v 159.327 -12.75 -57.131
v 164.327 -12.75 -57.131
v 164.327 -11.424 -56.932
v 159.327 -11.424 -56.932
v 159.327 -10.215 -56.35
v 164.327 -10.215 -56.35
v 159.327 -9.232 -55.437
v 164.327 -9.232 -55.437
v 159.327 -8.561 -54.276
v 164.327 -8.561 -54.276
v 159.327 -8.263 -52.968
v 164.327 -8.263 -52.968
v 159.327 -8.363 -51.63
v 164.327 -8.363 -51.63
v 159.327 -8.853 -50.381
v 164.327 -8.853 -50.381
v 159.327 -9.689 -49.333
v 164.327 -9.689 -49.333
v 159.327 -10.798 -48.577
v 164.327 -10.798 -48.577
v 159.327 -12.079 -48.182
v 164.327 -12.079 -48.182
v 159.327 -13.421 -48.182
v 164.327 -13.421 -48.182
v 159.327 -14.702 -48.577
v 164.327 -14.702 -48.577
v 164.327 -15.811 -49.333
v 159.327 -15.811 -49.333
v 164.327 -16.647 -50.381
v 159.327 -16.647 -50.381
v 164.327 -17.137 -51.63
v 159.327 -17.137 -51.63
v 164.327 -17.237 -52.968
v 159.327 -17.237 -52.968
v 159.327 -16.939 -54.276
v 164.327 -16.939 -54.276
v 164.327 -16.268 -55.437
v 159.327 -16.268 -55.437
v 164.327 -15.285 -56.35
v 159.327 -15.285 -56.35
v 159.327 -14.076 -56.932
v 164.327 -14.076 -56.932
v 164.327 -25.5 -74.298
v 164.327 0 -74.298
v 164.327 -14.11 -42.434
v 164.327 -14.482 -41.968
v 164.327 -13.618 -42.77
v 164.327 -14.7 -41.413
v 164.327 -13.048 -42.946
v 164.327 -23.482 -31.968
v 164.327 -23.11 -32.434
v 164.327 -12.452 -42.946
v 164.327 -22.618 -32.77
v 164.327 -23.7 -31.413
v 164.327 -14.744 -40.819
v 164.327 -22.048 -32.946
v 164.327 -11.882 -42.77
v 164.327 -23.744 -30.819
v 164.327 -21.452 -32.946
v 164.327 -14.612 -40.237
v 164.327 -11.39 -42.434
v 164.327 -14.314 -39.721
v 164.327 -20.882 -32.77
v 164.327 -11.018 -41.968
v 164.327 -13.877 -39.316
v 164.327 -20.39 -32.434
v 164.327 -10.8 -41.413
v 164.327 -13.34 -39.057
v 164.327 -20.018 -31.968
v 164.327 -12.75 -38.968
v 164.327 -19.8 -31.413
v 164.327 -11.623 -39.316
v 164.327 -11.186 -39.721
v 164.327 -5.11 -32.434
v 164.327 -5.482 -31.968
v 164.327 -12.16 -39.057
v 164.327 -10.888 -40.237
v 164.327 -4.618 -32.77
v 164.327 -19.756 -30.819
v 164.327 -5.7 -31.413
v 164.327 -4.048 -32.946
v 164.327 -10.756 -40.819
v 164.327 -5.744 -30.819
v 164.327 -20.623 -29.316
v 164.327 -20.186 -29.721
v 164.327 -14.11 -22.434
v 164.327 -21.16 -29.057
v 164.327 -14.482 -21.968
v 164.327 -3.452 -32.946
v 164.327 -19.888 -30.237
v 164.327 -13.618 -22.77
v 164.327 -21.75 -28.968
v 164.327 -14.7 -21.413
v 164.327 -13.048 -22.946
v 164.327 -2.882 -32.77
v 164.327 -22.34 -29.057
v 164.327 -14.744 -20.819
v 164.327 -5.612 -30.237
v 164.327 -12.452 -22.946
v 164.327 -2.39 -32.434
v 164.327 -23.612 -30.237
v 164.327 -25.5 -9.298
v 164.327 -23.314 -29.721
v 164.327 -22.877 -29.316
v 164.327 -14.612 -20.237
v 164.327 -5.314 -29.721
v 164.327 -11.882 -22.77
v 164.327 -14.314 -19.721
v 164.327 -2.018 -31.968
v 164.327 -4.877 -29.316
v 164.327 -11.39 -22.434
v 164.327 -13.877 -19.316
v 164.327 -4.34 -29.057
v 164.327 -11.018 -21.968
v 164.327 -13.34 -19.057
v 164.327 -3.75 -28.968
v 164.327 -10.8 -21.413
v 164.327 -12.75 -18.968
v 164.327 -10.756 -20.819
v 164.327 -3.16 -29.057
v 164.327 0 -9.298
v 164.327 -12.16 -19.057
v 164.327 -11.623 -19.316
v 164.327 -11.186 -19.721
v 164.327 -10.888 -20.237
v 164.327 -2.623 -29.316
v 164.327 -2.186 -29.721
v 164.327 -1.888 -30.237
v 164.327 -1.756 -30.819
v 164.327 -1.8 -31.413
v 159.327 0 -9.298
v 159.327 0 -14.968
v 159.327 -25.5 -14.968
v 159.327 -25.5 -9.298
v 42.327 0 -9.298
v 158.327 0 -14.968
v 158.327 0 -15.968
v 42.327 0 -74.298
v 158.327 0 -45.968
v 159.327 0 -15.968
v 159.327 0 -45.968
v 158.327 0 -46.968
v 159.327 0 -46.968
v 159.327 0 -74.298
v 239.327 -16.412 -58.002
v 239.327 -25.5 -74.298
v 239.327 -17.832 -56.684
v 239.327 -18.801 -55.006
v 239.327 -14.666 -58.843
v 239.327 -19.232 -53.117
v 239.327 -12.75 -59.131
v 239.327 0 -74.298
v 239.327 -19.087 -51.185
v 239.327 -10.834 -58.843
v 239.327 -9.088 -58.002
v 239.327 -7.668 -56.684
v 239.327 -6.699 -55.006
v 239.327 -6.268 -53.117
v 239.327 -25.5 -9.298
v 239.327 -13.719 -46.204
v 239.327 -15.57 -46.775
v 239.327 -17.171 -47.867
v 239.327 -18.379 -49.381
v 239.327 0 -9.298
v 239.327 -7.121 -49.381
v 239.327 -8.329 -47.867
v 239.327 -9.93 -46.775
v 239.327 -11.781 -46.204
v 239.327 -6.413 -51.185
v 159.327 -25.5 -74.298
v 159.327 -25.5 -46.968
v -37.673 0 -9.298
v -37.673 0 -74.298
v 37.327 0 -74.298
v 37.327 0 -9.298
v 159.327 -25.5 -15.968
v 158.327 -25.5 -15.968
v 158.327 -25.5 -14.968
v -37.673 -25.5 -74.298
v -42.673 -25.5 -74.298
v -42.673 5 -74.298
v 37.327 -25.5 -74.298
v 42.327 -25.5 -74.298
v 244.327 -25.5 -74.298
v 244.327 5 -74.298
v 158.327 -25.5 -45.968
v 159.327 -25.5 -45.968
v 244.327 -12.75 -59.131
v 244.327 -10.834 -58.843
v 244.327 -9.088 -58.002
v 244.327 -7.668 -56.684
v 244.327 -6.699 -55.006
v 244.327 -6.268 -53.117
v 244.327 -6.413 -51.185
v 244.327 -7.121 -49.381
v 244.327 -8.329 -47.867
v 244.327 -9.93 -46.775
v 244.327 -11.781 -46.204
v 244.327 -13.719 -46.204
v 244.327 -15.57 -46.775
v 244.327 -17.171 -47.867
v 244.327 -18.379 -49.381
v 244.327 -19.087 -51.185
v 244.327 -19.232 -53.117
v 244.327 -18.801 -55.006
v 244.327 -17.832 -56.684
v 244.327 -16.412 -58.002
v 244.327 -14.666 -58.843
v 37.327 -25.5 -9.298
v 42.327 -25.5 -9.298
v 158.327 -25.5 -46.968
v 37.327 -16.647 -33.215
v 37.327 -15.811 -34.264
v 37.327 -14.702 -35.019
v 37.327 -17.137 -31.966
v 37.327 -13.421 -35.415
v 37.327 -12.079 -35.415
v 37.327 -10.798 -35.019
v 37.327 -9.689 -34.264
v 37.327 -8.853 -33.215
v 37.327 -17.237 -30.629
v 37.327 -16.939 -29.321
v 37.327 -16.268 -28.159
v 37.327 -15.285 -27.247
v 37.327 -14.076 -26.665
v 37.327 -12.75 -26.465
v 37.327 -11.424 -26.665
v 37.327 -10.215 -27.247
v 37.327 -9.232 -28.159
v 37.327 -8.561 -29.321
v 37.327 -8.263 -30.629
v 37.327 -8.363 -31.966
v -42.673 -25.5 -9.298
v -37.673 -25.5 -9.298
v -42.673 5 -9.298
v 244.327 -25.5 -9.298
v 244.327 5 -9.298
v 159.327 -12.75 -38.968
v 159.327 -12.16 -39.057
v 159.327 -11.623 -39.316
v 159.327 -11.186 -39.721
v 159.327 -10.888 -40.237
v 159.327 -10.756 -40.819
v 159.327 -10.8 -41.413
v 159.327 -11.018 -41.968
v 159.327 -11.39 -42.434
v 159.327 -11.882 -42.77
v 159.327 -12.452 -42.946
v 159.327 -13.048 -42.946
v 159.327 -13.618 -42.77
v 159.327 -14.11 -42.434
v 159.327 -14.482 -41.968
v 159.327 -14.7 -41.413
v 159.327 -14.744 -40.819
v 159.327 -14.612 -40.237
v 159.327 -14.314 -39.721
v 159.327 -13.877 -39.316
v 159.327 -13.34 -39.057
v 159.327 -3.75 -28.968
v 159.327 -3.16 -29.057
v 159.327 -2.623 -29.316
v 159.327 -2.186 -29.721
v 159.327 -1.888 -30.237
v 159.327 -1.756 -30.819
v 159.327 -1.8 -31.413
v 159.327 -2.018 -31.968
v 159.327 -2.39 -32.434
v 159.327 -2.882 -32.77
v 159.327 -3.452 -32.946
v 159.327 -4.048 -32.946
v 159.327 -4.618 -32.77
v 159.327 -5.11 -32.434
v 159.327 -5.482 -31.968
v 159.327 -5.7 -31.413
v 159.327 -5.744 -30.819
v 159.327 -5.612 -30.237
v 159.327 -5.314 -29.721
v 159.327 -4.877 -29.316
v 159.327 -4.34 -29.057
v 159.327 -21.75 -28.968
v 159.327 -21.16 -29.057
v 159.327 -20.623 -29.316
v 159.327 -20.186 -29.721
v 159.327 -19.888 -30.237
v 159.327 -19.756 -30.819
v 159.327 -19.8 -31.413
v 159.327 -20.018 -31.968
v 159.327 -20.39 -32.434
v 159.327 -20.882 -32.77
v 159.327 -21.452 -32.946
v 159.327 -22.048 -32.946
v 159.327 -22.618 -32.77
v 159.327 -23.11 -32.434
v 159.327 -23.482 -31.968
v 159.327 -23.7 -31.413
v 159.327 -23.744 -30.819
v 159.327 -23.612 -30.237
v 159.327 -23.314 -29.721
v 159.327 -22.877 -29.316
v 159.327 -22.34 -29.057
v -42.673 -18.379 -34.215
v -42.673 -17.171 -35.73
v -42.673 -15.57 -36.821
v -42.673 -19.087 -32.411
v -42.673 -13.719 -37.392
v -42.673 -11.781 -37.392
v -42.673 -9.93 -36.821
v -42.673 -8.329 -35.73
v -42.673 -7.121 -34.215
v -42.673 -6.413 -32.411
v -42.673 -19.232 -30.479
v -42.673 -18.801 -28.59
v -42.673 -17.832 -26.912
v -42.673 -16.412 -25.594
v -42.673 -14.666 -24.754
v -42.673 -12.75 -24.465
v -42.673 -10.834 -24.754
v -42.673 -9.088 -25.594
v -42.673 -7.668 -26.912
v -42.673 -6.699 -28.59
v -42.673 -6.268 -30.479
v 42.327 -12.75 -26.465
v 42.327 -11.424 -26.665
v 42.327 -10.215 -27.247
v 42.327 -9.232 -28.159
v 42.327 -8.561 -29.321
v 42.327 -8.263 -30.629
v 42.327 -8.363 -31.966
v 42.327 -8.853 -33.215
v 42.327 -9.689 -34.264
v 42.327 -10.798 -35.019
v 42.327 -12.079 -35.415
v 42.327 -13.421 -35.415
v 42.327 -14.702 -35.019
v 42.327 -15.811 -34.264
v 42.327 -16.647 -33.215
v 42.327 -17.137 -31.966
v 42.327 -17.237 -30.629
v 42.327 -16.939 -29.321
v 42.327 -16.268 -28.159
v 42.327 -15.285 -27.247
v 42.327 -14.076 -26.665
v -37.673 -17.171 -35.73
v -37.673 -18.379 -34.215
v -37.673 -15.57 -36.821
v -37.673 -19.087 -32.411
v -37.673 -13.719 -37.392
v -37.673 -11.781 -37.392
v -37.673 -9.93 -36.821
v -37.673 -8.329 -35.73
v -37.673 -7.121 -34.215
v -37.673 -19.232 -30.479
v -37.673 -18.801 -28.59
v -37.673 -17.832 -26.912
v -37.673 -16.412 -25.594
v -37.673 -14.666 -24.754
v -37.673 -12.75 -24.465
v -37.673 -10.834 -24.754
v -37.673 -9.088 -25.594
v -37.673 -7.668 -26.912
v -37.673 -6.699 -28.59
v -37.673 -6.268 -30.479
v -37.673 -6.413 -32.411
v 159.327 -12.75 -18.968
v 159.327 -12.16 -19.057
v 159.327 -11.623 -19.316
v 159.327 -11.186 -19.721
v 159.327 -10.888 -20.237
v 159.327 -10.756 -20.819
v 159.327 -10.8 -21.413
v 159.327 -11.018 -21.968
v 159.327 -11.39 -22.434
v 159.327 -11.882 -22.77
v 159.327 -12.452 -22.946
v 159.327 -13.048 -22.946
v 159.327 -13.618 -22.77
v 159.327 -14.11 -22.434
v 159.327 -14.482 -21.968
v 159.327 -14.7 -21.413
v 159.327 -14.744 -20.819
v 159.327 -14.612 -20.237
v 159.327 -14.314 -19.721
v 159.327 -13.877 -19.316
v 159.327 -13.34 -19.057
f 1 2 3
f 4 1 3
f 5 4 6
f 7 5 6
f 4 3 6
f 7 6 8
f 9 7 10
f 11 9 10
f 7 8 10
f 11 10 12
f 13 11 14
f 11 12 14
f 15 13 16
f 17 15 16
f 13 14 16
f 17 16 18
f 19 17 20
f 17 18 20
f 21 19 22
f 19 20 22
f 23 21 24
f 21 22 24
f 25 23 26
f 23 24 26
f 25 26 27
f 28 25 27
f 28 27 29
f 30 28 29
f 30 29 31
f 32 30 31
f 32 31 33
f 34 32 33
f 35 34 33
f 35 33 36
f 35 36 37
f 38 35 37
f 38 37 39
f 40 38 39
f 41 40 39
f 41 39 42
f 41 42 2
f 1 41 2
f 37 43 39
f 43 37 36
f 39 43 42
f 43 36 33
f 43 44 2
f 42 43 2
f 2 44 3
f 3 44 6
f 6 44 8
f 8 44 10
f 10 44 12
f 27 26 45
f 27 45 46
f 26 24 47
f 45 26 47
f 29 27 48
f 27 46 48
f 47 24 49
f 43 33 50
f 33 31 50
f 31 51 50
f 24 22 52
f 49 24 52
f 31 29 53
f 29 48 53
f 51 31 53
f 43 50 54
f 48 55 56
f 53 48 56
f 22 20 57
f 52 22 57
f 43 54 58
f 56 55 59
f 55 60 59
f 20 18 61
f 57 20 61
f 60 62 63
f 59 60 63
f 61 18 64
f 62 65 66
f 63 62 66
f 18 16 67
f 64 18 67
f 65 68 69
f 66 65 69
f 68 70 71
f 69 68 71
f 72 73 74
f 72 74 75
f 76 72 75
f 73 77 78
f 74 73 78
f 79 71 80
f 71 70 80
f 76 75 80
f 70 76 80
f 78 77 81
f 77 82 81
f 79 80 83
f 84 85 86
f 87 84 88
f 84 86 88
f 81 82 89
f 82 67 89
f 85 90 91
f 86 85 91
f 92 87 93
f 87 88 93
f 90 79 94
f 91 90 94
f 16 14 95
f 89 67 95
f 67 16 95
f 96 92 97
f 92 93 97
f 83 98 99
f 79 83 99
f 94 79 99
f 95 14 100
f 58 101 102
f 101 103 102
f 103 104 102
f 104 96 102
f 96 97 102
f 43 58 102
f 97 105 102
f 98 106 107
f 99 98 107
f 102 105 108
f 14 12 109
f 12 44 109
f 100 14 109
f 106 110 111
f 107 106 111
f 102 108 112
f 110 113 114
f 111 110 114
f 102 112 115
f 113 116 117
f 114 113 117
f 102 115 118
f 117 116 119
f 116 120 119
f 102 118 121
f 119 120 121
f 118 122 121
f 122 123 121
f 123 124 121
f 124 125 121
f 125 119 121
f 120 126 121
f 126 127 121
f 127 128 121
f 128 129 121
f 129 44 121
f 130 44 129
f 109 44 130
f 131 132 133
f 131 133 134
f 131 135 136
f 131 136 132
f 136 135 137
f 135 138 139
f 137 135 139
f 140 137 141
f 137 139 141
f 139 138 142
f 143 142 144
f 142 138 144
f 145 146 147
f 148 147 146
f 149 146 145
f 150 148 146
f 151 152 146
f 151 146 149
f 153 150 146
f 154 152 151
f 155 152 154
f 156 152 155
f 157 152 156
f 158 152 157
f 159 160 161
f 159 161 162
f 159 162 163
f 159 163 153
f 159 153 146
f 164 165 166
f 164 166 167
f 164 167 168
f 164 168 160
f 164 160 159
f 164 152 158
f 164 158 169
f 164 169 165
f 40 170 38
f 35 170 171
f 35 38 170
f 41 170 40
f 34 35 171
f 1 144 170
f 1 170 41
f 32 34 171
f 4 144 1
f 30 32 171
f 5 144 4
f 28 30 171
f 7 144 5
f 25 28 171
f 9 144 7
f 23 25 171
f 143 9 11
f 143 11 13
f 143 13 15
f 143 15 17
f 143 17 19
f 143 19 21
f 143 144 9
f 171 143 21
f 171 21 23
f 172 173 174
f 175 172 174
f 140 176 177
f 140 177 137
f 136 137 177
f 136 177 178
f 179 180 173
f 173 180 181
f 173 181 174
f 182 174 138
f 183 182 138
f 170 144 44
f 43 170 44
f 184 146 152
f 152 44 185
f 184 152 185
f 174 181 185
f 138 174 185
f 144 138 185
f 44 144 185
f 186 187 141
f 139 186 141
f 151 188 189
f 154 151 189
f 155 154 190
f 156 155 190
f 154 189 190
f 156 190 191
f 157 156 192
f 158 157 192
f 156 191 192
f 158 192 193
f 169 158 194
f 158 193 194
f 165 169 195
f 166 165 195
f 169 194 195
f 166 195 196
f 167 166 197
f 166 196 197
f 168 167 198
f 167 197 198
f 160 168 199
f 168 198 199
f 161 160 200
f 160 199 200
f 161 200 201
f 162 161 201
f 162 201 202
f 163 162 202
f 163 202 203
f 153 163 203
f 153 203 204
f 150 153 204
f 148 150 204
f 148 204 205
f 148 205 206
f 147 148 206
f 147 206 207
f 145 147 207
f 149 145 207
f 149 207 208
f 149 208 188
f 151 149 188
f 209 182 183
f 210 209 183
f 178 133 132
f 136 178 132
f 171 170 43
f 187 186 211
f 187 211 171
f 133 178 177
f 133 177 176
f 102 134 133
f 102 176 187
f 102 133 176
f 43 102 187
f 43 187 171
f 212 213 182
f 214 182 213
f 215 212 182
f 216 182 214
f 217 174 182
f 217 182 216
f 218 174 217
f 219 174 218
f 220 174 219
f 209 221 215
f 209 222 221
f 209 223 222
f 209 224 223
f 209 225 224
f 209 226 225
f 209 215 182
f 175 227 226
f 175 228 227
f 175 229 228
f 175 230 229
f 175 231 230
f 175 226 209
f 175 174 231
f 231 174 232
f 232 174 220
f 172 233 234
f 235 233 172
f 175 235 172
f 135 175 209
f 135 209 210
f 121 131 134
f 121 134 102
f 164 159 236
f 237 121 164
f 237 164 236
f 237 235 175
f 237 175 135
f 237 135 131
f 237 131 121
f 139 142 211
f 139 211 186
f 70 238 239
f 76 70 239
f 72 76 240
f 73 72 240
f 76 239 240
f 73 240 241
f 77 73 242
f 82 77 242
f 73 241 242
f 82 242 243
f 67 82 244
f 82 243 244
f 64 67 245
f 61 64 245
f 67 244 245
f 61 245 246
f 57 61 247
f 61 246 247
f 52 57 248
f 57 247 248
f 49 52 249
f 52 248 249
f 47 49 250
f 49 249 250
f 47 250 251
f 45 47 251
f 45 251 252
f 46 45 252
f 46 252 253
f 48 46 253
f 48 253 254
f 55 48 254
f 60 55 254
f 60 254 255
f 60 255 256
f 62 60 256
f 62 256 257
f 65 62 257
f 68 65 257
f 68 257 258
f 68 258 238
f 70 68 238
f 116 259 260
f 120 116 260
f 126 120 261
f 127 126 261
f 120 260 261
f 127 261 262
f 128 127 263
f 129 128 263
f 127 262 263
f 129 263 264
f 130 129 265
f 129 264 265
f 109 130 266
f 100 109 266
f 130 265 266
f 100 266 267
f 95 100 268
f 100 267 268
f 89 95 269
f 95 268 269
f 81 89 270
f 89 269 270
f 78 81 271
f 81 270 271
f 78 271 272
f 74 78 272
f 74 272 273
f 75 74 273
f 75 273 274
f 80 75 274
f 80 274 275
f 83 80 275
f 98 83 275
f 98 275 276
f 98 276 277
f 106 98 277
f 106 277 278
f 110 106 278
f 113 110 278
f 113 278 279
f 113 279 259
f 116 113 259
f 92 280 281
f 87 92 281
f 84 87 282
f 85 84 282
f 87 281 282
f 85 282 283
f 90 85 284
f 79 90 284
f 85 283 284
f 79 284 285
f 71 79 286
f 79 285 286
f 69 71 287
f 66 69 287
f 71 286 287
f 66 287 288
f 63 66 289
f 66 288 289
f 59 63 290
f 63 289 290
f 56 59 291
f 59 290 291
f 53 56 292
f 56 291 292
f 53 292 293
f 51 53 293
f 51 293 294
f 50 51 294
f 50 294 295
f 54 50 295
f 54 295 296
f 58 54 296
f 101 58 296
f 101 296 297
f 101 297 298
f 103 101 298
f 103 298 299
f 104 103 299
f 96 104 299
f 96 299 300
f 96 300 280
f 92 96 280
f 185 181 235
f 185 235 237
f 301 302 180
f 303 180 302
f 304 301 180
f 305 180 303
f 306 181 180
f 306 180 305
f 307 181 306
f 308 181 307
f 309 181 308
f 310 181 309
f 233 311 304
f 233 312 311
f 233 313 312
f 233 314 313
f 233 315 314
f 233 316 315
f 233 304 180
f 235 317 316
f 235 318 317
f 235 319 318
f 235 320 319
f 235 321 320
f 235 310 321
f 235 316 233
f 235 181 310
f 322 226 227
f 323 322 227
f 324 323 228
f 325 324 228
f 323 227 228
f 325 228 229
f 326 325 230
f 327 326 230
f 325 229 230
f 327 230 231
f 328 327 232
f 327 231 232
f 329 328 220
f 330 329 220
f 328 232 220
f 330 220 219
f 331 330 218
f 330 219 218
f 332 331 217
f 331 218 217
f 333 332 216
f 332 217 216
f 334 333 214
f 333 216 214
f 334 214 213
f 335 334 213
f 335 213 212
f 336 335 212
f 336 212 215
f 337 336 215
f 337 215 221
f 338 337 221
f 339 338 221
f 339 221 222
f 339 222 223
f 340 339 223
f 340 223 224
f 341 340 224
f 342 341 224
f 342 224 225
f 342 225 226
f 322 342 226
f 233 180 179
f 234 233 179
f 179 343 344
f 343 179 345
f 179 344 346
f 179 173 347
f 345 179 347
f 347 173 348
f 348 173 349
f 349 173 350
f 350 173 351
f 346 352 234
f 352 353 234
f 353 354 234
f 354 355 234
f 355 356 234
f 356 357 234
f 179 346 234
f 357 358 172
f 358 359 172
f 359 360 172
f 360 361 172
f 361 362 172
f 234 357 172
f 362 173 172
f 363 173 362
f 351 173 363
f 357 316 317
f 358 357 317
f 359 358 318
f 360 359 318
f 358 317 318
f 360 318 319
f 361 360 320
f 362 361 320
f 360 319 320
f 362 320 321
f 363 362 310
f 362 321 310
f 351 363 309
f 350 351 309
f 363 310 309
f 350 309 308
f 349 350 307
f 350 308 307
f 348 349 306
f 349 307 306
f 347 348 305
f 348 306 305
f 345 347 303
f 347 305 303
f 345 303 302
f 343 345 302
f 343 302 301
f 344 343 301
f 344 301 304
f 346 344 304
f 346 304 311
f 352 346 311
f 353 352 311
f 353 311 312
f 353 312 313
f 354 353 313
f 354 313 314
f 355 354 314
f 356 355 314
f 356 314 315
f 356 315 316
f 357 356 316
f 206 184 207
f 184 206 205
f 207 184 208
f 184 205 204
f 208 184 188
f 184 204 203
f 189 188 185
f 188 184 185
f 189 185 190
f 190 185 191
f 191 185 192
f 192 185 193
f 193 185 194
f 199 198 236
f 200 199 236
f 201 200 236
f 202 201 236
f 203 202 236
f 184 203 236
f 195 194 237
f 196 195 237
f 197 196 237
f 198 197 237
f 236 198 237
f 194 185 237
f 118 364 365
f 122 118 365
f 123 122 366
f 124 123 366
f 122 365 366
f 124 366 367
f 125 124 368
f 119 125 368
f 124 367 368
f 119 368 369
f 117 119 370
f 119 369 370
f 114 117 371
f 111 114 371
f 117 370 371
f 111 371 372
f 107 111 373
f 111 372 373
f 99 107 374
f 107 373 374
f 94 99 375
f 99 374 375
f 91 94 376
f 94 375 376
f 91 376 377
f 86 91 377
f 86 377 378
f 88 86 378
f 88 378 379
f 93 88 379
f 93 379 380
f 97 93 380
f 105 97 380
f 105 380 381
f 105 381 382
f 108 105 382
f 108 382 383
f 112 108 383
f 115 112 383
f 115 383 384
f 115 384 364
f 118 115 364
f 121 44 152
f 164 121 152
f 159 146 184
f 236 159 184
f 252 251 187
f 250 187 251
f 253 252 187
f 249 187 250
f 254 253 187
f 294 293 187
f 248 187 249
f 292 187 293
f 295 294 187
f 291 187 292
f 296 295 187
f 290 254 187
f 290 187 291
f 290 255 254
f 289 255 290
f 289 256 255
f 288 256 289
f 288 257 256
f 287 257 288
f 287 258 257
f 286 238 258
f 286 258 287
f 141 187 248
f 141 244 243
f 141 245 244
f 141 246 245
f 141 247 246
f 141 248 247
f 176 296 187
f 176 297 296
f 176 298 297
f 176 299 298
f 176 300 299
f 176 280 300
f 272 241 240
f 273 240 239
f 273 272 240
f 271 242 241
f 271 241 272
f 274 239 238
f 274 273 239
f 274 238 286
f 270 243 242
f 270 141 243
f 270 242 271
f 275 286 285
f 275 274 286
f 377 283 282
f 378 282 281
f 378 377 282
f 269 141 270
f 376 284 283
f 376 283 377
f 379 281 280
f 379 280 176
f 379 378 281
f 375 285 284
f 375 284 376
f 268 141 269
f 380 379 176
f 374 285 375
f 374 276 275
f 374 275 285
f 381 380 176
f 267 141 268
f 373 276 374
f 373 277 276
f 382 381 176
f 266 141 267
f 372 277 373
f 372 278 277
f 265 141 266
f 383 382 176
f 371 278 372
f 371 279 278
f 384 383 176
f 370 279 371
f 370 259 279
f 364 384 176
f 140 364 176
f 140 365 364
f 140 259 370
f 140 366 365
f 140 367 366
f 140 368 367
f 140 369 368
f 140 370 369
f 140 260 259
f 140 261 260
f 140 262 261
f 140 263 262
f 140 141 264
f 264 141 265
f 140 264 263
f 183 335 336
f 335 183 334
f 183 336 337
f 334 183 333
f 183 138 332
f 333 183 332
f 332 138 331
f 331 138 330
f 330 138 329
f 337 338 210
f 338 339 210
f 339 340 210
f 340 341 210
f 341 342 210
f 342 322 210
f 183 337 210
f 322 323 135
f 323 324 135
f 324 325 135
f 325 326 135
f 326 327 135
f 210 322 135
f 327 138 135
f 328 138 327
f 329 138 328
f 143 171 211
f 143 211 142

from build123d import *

# Parameters (mm, degrees)
SKETCH2_W           = 287
SKETCH2_H           = 65
BOSS_EXTRUDE1_DEPTH = 5
SKETCH4_W           = 5
SKETCH4_H           = 65
BOSS_EXTRUDE2_DEPTH = 25.5
SKETCH5_W           = 5
SKETCH5_H           = 65
BOSS_EXTRUDE3_DEPTH = 25.5
SKETCH6_W           = 5
SKETCH6_H           = 65
BOSS_EXTRUDE4_DEPTH = 25.5
SKETCH8_W           = 5
SKETCH8_H           = 65
BOSS_EXTRUDE5_DEPTH = 25.5
CUT_EXTRUDE1_REACH  = 299.556
SKETCH7_R           = 6.5
CUT_EXTRUDE2_REACH  = 299.556
SKETCH9_R           = 6.5
CUT_EXTRUDE3_REACH  = 223.403
SKETCH11_R          = 4.5
CUT_EXTRUDE4_REACH  = 223.403
SKETCH10_R          = 4.5
SKETCH14_W          = 1
SKETCH14_H          = 25.5
BOSS_EXTRUDE6_DEPTH = 1
CUT_EXTRUDE6_REACH  = 218.736
SKETCH15_R          = 2


with BuildPart() as part:
    # Sketch2 → Boss-Extrude1 (new body)
    with BuildSketch(Plane(origin=(0, 0, 0), x_dir=(1, 0, 0), z_dir=(0, 1, 0))):
        with Locations((100.827281974, 41.798134807)):
            Rectangle(SKETCH2_W, SKETCH2_H)
    extrude(amount=BOSS_EXTRUDE1_DEPTH)

    # Sketch4 → Boss-Extrude2 (add)
    with BuildSketch(Plane.XZ):
        with Locations((-40.172718026, -41.798134807)):
            Rectangle(SKETCH4_W, SKETCH4_H)
    extrude(amount=BOSS_EXTRUDE2_DEPTH)

    # Sketch5 → Boss-Extrude3 (add)
    with BuildSketch(Plane.XZ):
        with Locations((39.827281974, -41.798134807)):
            Rectangle(SKETCH5_W, SKETCH5_H)
    extrude(amount=BOSS_EXTRUDE3_DEPTH)

    # Sketch6 → Boss-Extrude4 (add)
    with BuildSketch(Plane.XZ):
        with Locations((241.827281974, -41.798134807)):
            Rectangle(SKETCH6_W, SKETCH6_H)
    extrude(amount=BOSS_EXTRUDE4_DEPTH)

    # Sketch8 → Boss-Extrude5 (add)
    with BuildSketch(Plane.XZ):
        with Locations((161.827281974, -41.798134807)):
            Rectangle(SKETCH8_W, SKETCH8_H)
    extrude(amount=BOSS_EXTRUDE5_DEPTH)

    # Sketch7 → Cut-Extrude1 (cut, up to next)
    with BuildSketch(Plane.ZY.offset(42.672718026), mode=Mode.PRIVATE) as cut_extrude1_sk1:
        with Locations((-30.964801474, -12.75)):
            Circle(SKETCH7_R)
    cut_extrude1_tool1 = extrude(cut_extrude1_sk1.sketch, amount=-CUT_EXTRUDE1_REACH, mode=Mode.PRIVATE) & part.part
    add(cut_extrude1_tool1.solids().sort_by_distance((-42.672718, -12.75, -30.964801))[0], mode=Mode.SUBTRACT)

    # Sketch9 → Cut-Extrude2 (cut, up to next)
    with BuildSketch(Plane(origin=(244.327281974, 0, 0), x_dir=(0, 0, -1), z_dir=(1, 0, 0)), mode=Mode.PRIVATE) as cut_extrude2_sk1:
        with Locations((52.631468141, -12.75)):
            Circle(SKETCH9_R)
    cut_extrude2_tool1 = extrude(cut_extrude2_sk1.sketch, amount=-CUT_EXTRUDE2_REACH, mode=Mode.PRIVATE) & part.part
    add(cut_extrude2_tool1.solids().sort_by_distance((244.327282, -12.75, -52.631468))[0], mode=Mode.SUBTRACT)

    # Sketch11 → Cut-Extrude3 (cut, up to next)
    with BuildSketch(Plane(origin=(164.327281974, 0, 0), x_dir=(0, 0, -1), z_dir=(1, 0, 0)), mode=Mode.PRIVATE) as cut_extrude3_sk1:
        with Locations((52.631468141, -12.75)):
            Circle(SKETCH11_R)
    cut_extrude3_tool1 = extrude(cut_extrude3_sk1.sketch, amount=-CUT_EXTRUDE3_REACH, mode=Mode.PRIVATE) & part.part
    add(cut_extrude3_tool1.solids().sort_by_distance((164.327282, -12.75, -52.631468))[0], mode=Mode.SUBTRACT)

    # Sketch10 → Cut-Extrude4 (cut, up to next)
    with BuildSketch(Plane.ZY.offset(-37.327281974), mode=Mode.PRIVATE) as cut_extrude4_sk1:
        with Locations((-30.964801474, -12.75)):
            Circle(SKETCH10_R)
    cut_extrude4_tool1 = extrude(cut_extrude4_sk1.sketch, amount=-CUT_EXTRUDE4_REACH, mode=Mode.PRIVATE) & part.part
    add(cut_extrude4_tool1.solids().sort_by_distance((37.327282, -12.75, -30.964801))[0], mode=Mode.SUBTRACT)

    # Sketch14 → Boss-Extrude6 (add)
    with BuildSketch(Plane.ZY.offset(-159.327281974)):
        with Locations((-15.468134807, -12.75)):
            Rectangle(SKETCH14_W, SKETCH14_H)
        with Locations((-46.468134807, -12.75)):
            Rectangle(SKETCH14_W, SKETCH14_H)
    extrude(amount=BOSS_EXTRUDE6_DEPTH)

    # Sketch15 → Cut-Extrude6 (cut, up to next)
    with BuildSketch(Plane.ZY.offset(-159.327281974), mode=Mode.PRIVATE) as cut_extrude6_sk1:
        with Locations((-20.968134807, -12.75)):
            Circle(SKETCH15_R)
    cut_extrude6_tool1 = extrude(cut_extrude6_sk1.sketch, amount=-CUT_EXTRUDE6_REACH, mode=Mode.PRIVATE) & part.part
    # Sketch15 → Cut-Extrude6 (cut, up to next)
    with BuildSketch(Plane.ZY.offset(-159.327281974), mode=Mode.PRIVATE) as cut_extrude6_sk2:
        with Locations((-40.968134807, -12.75)):
            Circle(SKETCH15_R)
    cut_extrude6_tool2 = extrude(cut_extrude6_sk2.sketch, amount=-CUT_EXTRUDE6_REACH, mode=Mode.PRIVATE) & part.part
    # Sketch15 → Cut-Extrude6 (cut, up to next)
    with BuildSketch(Plane.ZY.offset(-159.327281974), mode=Mode.PRIVATE) as cut_extrude6_sk3:
        with Locations((-30.968134807, -21.75)):
            Circle(SKETCH15_R)
    cut_extrude6_tool3 = extrude(cut_extrude6_sk3.sketch, amount=-CUT_EXTRUDE6_REACH, mode=Mode.PRIVATE) & part.part
    # Sketch15 → Cut-Extrude6 (cut, up to next)
    with BuildSketch(Plane.ZY.offset(-159.327281974), mode=Mode.PRIVATE) as cut_extrude6_sk4:
        with Locations((-30.968134807, -3.75)):
            Circle(SKETCH15_R)
    cut_extrude6_tool4 = extrude(cut_extrude6_sk4.sketch, amount=-CUT_EXTRUDE6_REACH, mode=Mode.PRIVATE) & part.part
    add(cut_extrude6_tool1.solids().sort_by_distance((159.327282, -12.75, -20.968135))[0], mode=Mode.SUBTRACT)
    add(cut_extrude6_tool2.solids().sort_by_distance((159.327282, -12.75, -40.968135))[0], mode=Mode.SUBTRACT)
    add(cut_extrude6_tool3.solids().sort_by_distance((159.327282, -21.75, -30.968135))[0], mode=Mode.SUBTRACT)
    add(cut_extrude6_tool4.solids().sort_by_distance((159.327282, -3.75, -30.968135))[0], mode=Mode.SUBTRACT)


solid = part.part
